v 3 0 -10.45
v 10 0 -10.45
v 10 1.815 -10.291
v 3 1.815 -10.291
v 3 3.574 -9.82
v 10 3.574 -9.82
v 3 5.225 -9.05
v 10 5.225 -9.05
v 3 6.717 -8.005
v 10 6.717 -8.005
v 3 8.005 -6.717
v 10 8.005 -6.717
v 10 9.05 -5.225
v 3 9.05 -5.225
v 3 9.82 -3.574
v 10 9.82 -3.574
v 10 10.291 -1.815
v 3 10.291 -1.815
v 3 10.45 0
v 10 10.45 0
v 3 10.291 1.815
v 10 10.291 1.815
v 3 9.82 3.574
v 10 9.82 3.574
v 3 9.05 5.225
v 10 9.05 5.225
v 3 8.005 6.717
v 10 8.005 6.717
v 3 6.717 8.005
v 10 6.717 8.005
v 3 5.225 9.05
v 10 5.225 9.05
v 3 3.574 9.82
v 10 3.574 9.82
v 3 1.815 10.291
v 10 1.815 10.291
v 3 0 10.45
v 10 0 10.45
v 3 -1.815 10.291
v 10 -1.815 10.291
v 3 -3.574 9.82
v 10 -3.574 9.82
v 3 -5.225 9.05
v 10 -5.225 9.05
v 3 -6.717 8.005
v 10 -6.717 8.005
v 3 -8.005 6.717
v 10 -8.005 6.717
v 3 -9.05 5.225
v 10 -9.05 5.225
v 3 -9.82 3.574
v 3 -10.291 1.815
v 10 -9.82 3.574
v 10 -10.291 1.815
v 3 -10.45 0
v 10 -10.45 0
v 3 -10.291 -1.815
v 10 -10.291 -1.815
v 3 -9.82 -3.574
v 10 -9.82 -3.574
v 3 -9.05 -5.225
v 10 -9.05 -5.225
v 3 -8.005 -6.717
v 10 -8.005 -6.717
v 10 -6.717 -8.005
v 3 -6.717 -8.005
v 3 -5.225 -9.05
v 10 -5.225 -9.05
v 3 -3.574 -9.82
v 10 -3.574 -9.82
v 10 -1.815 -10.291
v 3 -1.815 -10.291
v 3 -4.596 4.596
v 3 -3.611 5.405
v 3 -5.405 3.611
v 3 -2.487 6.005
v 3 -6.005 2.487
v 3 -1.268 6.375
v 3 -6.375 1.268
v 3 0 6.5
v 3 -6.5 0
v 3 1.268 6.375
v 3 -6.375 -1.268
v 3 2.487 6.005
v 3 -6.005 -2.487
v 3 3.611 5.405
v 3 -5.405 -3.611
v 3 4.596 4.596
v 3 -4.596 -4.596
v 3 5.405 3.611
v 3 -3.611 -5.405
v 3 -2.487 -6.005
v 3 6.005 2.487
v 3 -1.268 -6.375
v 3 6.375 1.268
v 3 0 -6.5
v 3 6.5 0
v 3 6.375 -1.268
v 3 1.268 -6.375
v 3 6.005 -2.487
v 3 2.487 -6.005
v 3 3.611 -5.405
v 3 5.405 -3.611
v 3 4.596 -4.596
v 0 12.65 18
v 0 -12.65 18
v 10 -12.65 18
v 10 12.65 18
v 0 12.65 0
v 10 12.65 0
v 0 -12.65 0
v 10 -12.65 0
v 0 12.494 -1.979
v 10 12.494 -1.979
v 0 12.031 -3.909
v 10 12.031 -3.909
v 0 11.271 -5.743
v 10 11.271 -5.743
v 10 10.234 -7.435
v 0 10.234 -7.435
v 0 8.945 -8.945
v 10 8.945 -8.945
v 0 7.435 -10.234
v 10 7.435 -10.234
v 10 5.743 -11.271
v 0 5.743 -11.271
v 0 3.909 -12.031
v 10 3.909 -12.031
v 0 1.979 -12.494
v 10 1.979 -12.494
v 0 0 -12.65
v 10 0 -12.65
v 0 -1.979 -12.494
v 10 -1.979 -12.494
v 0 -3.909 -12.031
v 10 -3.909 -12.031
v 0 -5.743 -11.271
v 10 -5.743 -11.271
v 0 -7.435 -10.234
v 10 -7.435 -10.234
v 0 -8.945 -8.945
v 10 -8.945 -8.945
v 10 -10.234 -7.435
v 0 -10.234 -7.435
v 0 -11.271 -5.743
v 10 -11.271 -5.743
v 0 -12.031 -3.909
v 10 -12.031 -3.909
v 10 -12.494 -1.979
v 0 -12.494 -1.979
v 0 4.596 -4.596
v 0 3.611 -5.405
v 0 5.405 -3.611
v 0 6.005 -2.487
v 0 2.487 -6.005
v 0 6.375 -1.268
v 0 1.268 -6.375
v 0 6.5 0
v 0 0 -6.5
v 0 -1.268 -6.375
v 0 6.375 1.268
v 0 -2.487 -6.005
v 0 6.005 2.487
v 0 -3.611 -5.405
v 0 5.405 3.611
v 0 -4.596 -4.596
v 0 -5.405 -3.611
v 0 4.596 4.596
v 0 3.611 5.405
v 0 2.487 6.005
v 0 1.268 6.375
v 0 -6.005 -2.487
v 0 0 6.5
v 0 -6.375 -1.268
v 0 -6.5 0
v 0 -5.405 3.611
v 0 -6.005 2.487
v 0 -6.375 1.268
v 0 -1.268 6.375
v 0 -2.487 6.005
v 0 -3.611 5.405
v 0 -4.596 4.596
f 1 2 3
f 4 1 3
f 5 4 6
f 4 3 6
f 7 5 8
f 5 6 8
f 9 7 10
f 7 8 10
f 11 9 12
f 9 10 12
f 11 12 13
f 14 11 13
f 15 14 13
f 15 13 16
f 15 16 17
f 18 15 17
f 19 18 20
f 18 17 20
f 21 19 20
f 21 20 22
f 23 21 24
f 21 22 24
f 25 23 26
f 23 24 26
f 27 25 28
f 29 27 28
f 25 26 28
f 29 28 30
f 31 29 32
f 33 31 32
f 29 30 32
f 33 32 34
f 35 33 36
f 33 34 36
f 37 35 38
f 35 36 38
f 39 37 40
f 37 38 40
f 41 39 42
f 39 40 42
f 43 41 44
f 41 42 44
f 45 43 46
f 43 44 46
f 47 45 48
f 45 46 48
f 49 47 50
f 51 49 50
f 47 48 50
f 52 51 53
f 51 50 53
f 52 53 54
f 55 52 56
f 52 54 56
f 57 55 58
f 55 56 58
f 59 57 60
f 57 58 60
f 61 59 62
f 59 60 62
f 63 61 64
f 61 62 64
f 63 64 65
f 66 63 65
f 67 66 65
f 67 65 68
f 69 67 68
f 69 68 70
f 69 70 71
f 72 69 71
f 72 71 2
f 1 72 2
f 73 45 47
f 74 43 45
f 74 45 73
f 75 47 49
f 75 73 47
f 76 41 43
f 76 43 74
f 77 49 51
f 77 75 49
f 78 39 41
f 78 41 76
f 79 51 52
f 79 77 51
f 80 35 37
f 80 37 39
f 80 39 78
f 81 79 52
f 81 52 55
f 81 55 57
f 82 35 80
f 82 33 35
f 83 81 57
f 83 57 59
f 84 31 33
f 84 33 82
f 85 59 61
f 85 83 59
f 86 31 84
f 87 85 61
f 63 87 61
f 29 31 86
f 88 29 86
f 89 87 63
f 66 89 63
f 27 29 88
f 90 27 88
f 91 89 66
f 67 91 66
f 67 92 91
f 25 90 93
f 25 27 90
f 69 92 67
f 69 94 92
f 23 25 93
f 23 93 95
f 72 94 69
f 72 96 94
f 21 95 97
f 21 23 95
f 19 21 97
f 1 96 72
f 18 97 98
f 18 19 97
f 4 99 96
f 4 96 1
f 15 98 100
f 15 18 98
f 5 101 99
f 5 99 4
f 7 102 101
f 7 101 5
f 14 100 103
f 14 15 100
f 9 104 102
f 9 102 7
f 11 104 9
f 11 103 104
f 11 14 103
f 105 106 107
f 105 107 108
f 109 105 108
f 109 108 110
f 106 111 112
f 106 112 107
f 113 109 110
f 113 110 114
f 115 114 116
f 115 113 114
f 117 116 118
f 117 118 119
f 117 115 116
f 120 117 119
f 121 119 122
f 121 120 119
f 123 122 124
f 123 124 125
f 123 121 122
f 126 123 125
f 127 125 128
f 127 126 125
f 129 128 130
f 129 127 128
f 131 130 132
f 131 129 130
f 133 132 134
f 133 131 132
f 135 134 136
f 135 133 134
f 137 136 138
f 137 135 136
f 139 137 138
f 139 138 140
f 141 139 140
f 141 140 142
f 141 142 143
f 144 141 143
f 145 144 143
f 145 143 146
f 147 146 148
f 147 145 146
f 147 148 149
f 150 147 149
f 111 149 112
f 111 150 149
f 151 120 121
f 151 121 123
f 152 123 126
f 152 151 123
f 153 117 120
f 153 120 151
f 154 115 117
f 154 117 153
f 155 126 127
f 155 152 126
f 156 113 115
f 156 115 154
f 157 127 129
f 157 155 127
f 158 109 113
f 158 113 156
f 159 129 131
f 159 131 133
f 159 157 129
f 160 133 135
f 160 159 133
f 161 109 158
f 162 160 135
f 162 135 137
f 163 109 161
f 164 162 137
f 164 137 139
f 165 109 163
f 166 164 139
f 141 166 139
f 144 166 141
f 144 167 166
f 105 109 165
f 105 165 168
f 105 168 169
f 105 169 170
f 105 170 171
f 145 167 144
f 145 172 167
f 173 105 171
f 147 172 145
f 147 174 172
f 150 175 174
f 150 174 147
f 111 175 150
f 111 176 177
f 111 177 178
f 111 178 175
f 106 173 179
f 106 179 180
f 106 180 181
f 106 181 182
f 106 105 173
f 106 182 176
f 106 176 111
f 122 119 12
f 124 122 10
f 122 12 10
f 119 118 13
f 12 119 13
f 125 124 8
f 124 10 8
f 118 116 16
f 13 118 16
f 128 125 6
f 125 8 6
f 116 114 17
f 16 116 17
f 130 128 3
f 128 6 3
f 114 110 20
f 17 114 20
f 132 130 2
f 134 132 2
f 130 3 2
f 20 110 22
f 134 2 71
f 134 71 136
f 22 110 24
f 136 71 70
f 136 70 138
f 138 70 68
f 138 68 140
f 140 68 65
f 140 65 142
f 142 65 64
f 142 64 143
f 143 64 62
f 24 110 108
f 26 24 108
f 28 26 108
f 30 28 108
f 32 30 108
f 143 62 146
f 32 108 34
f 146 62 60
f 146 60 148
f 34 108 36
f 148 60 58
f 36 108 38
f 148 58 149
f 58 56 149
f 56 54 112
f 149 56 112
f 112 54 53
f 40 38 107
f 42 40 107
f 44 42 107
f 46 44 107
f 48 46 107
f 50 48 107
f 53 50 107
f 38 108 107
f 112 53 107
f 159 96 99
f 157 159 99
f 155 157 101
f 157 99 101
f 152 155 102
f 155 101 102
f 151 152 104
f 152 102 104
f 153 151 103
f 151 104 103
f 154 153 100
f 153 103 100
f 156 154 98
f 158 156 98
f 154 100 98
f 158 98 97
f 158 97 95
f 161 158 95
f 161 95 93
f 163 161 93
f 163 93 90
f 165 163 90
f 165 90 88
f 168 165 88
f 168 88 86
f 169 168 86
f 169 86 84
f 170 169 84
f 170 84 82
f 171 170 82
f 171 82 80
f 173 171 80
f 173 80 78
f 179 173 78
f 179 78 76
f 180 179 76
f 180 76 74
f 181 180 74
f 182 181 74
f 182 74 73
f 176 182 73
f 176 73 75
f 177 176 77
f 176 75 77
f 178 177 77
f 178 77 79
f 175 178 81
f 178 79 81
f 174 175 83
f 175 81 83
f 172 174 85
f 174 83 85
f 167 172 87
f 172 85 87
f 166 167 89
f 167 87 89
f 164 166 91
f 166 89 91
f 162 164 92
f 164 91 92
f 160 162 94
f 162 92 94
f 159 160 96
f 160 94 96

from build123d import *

# Parameters (mm, degrees)
BOSS_EXTRUDE1_DEPTH = 10
SKETCH2_R           = 10.45
CUT_EXTRUDE1_DEPTH  = 7
SKETCH3_R           = 6.5
CUT_EXTRUDE2_DEPTH  = 24.087280048


with BuildPart() as part:
    # Sketch1 → Boss-Extrude1 (new body)
    with BuildSketch(Plane.YZ):
        with BuildLine():
            Line((-12.65, 0), (-12.65, 18))
            Line((-12.65, 18), (12.65, 18))
            Line((12.65, 18), (12.65, 0))
            ThreePointArc((12.65, 0), (0, -12.65), (-12.65, 0))
        make_face()
    extrude(amount=BOSS_EXTRUDE1_DEPTH)

    # Sketch2 → Cut-Extrude1 (cut)
    with BuildSketch(Plane.YZ.offset(10)):
        with Locations(Location((0, 0, 0), (0, 0, 270))):
            Circle(SKETCH2_R)
    extrude(amount=-CUT_EXTRUDE1_DEPTH, mode=Mode.SUBTRACT)

    # Sketch3 → Cut-Extrude2 (cut, through all)
    with BuildSketch(Plane.YZ.offset(3)):
        with Locations(Location((0, 0, 0), (0, 0, 270))):
            Circle(SKETCH3_R)
    extrude(amount=-CUT_EXTRUDE2_DEPTH, mode=Mode.SUBTRACT)


solid = part.part
